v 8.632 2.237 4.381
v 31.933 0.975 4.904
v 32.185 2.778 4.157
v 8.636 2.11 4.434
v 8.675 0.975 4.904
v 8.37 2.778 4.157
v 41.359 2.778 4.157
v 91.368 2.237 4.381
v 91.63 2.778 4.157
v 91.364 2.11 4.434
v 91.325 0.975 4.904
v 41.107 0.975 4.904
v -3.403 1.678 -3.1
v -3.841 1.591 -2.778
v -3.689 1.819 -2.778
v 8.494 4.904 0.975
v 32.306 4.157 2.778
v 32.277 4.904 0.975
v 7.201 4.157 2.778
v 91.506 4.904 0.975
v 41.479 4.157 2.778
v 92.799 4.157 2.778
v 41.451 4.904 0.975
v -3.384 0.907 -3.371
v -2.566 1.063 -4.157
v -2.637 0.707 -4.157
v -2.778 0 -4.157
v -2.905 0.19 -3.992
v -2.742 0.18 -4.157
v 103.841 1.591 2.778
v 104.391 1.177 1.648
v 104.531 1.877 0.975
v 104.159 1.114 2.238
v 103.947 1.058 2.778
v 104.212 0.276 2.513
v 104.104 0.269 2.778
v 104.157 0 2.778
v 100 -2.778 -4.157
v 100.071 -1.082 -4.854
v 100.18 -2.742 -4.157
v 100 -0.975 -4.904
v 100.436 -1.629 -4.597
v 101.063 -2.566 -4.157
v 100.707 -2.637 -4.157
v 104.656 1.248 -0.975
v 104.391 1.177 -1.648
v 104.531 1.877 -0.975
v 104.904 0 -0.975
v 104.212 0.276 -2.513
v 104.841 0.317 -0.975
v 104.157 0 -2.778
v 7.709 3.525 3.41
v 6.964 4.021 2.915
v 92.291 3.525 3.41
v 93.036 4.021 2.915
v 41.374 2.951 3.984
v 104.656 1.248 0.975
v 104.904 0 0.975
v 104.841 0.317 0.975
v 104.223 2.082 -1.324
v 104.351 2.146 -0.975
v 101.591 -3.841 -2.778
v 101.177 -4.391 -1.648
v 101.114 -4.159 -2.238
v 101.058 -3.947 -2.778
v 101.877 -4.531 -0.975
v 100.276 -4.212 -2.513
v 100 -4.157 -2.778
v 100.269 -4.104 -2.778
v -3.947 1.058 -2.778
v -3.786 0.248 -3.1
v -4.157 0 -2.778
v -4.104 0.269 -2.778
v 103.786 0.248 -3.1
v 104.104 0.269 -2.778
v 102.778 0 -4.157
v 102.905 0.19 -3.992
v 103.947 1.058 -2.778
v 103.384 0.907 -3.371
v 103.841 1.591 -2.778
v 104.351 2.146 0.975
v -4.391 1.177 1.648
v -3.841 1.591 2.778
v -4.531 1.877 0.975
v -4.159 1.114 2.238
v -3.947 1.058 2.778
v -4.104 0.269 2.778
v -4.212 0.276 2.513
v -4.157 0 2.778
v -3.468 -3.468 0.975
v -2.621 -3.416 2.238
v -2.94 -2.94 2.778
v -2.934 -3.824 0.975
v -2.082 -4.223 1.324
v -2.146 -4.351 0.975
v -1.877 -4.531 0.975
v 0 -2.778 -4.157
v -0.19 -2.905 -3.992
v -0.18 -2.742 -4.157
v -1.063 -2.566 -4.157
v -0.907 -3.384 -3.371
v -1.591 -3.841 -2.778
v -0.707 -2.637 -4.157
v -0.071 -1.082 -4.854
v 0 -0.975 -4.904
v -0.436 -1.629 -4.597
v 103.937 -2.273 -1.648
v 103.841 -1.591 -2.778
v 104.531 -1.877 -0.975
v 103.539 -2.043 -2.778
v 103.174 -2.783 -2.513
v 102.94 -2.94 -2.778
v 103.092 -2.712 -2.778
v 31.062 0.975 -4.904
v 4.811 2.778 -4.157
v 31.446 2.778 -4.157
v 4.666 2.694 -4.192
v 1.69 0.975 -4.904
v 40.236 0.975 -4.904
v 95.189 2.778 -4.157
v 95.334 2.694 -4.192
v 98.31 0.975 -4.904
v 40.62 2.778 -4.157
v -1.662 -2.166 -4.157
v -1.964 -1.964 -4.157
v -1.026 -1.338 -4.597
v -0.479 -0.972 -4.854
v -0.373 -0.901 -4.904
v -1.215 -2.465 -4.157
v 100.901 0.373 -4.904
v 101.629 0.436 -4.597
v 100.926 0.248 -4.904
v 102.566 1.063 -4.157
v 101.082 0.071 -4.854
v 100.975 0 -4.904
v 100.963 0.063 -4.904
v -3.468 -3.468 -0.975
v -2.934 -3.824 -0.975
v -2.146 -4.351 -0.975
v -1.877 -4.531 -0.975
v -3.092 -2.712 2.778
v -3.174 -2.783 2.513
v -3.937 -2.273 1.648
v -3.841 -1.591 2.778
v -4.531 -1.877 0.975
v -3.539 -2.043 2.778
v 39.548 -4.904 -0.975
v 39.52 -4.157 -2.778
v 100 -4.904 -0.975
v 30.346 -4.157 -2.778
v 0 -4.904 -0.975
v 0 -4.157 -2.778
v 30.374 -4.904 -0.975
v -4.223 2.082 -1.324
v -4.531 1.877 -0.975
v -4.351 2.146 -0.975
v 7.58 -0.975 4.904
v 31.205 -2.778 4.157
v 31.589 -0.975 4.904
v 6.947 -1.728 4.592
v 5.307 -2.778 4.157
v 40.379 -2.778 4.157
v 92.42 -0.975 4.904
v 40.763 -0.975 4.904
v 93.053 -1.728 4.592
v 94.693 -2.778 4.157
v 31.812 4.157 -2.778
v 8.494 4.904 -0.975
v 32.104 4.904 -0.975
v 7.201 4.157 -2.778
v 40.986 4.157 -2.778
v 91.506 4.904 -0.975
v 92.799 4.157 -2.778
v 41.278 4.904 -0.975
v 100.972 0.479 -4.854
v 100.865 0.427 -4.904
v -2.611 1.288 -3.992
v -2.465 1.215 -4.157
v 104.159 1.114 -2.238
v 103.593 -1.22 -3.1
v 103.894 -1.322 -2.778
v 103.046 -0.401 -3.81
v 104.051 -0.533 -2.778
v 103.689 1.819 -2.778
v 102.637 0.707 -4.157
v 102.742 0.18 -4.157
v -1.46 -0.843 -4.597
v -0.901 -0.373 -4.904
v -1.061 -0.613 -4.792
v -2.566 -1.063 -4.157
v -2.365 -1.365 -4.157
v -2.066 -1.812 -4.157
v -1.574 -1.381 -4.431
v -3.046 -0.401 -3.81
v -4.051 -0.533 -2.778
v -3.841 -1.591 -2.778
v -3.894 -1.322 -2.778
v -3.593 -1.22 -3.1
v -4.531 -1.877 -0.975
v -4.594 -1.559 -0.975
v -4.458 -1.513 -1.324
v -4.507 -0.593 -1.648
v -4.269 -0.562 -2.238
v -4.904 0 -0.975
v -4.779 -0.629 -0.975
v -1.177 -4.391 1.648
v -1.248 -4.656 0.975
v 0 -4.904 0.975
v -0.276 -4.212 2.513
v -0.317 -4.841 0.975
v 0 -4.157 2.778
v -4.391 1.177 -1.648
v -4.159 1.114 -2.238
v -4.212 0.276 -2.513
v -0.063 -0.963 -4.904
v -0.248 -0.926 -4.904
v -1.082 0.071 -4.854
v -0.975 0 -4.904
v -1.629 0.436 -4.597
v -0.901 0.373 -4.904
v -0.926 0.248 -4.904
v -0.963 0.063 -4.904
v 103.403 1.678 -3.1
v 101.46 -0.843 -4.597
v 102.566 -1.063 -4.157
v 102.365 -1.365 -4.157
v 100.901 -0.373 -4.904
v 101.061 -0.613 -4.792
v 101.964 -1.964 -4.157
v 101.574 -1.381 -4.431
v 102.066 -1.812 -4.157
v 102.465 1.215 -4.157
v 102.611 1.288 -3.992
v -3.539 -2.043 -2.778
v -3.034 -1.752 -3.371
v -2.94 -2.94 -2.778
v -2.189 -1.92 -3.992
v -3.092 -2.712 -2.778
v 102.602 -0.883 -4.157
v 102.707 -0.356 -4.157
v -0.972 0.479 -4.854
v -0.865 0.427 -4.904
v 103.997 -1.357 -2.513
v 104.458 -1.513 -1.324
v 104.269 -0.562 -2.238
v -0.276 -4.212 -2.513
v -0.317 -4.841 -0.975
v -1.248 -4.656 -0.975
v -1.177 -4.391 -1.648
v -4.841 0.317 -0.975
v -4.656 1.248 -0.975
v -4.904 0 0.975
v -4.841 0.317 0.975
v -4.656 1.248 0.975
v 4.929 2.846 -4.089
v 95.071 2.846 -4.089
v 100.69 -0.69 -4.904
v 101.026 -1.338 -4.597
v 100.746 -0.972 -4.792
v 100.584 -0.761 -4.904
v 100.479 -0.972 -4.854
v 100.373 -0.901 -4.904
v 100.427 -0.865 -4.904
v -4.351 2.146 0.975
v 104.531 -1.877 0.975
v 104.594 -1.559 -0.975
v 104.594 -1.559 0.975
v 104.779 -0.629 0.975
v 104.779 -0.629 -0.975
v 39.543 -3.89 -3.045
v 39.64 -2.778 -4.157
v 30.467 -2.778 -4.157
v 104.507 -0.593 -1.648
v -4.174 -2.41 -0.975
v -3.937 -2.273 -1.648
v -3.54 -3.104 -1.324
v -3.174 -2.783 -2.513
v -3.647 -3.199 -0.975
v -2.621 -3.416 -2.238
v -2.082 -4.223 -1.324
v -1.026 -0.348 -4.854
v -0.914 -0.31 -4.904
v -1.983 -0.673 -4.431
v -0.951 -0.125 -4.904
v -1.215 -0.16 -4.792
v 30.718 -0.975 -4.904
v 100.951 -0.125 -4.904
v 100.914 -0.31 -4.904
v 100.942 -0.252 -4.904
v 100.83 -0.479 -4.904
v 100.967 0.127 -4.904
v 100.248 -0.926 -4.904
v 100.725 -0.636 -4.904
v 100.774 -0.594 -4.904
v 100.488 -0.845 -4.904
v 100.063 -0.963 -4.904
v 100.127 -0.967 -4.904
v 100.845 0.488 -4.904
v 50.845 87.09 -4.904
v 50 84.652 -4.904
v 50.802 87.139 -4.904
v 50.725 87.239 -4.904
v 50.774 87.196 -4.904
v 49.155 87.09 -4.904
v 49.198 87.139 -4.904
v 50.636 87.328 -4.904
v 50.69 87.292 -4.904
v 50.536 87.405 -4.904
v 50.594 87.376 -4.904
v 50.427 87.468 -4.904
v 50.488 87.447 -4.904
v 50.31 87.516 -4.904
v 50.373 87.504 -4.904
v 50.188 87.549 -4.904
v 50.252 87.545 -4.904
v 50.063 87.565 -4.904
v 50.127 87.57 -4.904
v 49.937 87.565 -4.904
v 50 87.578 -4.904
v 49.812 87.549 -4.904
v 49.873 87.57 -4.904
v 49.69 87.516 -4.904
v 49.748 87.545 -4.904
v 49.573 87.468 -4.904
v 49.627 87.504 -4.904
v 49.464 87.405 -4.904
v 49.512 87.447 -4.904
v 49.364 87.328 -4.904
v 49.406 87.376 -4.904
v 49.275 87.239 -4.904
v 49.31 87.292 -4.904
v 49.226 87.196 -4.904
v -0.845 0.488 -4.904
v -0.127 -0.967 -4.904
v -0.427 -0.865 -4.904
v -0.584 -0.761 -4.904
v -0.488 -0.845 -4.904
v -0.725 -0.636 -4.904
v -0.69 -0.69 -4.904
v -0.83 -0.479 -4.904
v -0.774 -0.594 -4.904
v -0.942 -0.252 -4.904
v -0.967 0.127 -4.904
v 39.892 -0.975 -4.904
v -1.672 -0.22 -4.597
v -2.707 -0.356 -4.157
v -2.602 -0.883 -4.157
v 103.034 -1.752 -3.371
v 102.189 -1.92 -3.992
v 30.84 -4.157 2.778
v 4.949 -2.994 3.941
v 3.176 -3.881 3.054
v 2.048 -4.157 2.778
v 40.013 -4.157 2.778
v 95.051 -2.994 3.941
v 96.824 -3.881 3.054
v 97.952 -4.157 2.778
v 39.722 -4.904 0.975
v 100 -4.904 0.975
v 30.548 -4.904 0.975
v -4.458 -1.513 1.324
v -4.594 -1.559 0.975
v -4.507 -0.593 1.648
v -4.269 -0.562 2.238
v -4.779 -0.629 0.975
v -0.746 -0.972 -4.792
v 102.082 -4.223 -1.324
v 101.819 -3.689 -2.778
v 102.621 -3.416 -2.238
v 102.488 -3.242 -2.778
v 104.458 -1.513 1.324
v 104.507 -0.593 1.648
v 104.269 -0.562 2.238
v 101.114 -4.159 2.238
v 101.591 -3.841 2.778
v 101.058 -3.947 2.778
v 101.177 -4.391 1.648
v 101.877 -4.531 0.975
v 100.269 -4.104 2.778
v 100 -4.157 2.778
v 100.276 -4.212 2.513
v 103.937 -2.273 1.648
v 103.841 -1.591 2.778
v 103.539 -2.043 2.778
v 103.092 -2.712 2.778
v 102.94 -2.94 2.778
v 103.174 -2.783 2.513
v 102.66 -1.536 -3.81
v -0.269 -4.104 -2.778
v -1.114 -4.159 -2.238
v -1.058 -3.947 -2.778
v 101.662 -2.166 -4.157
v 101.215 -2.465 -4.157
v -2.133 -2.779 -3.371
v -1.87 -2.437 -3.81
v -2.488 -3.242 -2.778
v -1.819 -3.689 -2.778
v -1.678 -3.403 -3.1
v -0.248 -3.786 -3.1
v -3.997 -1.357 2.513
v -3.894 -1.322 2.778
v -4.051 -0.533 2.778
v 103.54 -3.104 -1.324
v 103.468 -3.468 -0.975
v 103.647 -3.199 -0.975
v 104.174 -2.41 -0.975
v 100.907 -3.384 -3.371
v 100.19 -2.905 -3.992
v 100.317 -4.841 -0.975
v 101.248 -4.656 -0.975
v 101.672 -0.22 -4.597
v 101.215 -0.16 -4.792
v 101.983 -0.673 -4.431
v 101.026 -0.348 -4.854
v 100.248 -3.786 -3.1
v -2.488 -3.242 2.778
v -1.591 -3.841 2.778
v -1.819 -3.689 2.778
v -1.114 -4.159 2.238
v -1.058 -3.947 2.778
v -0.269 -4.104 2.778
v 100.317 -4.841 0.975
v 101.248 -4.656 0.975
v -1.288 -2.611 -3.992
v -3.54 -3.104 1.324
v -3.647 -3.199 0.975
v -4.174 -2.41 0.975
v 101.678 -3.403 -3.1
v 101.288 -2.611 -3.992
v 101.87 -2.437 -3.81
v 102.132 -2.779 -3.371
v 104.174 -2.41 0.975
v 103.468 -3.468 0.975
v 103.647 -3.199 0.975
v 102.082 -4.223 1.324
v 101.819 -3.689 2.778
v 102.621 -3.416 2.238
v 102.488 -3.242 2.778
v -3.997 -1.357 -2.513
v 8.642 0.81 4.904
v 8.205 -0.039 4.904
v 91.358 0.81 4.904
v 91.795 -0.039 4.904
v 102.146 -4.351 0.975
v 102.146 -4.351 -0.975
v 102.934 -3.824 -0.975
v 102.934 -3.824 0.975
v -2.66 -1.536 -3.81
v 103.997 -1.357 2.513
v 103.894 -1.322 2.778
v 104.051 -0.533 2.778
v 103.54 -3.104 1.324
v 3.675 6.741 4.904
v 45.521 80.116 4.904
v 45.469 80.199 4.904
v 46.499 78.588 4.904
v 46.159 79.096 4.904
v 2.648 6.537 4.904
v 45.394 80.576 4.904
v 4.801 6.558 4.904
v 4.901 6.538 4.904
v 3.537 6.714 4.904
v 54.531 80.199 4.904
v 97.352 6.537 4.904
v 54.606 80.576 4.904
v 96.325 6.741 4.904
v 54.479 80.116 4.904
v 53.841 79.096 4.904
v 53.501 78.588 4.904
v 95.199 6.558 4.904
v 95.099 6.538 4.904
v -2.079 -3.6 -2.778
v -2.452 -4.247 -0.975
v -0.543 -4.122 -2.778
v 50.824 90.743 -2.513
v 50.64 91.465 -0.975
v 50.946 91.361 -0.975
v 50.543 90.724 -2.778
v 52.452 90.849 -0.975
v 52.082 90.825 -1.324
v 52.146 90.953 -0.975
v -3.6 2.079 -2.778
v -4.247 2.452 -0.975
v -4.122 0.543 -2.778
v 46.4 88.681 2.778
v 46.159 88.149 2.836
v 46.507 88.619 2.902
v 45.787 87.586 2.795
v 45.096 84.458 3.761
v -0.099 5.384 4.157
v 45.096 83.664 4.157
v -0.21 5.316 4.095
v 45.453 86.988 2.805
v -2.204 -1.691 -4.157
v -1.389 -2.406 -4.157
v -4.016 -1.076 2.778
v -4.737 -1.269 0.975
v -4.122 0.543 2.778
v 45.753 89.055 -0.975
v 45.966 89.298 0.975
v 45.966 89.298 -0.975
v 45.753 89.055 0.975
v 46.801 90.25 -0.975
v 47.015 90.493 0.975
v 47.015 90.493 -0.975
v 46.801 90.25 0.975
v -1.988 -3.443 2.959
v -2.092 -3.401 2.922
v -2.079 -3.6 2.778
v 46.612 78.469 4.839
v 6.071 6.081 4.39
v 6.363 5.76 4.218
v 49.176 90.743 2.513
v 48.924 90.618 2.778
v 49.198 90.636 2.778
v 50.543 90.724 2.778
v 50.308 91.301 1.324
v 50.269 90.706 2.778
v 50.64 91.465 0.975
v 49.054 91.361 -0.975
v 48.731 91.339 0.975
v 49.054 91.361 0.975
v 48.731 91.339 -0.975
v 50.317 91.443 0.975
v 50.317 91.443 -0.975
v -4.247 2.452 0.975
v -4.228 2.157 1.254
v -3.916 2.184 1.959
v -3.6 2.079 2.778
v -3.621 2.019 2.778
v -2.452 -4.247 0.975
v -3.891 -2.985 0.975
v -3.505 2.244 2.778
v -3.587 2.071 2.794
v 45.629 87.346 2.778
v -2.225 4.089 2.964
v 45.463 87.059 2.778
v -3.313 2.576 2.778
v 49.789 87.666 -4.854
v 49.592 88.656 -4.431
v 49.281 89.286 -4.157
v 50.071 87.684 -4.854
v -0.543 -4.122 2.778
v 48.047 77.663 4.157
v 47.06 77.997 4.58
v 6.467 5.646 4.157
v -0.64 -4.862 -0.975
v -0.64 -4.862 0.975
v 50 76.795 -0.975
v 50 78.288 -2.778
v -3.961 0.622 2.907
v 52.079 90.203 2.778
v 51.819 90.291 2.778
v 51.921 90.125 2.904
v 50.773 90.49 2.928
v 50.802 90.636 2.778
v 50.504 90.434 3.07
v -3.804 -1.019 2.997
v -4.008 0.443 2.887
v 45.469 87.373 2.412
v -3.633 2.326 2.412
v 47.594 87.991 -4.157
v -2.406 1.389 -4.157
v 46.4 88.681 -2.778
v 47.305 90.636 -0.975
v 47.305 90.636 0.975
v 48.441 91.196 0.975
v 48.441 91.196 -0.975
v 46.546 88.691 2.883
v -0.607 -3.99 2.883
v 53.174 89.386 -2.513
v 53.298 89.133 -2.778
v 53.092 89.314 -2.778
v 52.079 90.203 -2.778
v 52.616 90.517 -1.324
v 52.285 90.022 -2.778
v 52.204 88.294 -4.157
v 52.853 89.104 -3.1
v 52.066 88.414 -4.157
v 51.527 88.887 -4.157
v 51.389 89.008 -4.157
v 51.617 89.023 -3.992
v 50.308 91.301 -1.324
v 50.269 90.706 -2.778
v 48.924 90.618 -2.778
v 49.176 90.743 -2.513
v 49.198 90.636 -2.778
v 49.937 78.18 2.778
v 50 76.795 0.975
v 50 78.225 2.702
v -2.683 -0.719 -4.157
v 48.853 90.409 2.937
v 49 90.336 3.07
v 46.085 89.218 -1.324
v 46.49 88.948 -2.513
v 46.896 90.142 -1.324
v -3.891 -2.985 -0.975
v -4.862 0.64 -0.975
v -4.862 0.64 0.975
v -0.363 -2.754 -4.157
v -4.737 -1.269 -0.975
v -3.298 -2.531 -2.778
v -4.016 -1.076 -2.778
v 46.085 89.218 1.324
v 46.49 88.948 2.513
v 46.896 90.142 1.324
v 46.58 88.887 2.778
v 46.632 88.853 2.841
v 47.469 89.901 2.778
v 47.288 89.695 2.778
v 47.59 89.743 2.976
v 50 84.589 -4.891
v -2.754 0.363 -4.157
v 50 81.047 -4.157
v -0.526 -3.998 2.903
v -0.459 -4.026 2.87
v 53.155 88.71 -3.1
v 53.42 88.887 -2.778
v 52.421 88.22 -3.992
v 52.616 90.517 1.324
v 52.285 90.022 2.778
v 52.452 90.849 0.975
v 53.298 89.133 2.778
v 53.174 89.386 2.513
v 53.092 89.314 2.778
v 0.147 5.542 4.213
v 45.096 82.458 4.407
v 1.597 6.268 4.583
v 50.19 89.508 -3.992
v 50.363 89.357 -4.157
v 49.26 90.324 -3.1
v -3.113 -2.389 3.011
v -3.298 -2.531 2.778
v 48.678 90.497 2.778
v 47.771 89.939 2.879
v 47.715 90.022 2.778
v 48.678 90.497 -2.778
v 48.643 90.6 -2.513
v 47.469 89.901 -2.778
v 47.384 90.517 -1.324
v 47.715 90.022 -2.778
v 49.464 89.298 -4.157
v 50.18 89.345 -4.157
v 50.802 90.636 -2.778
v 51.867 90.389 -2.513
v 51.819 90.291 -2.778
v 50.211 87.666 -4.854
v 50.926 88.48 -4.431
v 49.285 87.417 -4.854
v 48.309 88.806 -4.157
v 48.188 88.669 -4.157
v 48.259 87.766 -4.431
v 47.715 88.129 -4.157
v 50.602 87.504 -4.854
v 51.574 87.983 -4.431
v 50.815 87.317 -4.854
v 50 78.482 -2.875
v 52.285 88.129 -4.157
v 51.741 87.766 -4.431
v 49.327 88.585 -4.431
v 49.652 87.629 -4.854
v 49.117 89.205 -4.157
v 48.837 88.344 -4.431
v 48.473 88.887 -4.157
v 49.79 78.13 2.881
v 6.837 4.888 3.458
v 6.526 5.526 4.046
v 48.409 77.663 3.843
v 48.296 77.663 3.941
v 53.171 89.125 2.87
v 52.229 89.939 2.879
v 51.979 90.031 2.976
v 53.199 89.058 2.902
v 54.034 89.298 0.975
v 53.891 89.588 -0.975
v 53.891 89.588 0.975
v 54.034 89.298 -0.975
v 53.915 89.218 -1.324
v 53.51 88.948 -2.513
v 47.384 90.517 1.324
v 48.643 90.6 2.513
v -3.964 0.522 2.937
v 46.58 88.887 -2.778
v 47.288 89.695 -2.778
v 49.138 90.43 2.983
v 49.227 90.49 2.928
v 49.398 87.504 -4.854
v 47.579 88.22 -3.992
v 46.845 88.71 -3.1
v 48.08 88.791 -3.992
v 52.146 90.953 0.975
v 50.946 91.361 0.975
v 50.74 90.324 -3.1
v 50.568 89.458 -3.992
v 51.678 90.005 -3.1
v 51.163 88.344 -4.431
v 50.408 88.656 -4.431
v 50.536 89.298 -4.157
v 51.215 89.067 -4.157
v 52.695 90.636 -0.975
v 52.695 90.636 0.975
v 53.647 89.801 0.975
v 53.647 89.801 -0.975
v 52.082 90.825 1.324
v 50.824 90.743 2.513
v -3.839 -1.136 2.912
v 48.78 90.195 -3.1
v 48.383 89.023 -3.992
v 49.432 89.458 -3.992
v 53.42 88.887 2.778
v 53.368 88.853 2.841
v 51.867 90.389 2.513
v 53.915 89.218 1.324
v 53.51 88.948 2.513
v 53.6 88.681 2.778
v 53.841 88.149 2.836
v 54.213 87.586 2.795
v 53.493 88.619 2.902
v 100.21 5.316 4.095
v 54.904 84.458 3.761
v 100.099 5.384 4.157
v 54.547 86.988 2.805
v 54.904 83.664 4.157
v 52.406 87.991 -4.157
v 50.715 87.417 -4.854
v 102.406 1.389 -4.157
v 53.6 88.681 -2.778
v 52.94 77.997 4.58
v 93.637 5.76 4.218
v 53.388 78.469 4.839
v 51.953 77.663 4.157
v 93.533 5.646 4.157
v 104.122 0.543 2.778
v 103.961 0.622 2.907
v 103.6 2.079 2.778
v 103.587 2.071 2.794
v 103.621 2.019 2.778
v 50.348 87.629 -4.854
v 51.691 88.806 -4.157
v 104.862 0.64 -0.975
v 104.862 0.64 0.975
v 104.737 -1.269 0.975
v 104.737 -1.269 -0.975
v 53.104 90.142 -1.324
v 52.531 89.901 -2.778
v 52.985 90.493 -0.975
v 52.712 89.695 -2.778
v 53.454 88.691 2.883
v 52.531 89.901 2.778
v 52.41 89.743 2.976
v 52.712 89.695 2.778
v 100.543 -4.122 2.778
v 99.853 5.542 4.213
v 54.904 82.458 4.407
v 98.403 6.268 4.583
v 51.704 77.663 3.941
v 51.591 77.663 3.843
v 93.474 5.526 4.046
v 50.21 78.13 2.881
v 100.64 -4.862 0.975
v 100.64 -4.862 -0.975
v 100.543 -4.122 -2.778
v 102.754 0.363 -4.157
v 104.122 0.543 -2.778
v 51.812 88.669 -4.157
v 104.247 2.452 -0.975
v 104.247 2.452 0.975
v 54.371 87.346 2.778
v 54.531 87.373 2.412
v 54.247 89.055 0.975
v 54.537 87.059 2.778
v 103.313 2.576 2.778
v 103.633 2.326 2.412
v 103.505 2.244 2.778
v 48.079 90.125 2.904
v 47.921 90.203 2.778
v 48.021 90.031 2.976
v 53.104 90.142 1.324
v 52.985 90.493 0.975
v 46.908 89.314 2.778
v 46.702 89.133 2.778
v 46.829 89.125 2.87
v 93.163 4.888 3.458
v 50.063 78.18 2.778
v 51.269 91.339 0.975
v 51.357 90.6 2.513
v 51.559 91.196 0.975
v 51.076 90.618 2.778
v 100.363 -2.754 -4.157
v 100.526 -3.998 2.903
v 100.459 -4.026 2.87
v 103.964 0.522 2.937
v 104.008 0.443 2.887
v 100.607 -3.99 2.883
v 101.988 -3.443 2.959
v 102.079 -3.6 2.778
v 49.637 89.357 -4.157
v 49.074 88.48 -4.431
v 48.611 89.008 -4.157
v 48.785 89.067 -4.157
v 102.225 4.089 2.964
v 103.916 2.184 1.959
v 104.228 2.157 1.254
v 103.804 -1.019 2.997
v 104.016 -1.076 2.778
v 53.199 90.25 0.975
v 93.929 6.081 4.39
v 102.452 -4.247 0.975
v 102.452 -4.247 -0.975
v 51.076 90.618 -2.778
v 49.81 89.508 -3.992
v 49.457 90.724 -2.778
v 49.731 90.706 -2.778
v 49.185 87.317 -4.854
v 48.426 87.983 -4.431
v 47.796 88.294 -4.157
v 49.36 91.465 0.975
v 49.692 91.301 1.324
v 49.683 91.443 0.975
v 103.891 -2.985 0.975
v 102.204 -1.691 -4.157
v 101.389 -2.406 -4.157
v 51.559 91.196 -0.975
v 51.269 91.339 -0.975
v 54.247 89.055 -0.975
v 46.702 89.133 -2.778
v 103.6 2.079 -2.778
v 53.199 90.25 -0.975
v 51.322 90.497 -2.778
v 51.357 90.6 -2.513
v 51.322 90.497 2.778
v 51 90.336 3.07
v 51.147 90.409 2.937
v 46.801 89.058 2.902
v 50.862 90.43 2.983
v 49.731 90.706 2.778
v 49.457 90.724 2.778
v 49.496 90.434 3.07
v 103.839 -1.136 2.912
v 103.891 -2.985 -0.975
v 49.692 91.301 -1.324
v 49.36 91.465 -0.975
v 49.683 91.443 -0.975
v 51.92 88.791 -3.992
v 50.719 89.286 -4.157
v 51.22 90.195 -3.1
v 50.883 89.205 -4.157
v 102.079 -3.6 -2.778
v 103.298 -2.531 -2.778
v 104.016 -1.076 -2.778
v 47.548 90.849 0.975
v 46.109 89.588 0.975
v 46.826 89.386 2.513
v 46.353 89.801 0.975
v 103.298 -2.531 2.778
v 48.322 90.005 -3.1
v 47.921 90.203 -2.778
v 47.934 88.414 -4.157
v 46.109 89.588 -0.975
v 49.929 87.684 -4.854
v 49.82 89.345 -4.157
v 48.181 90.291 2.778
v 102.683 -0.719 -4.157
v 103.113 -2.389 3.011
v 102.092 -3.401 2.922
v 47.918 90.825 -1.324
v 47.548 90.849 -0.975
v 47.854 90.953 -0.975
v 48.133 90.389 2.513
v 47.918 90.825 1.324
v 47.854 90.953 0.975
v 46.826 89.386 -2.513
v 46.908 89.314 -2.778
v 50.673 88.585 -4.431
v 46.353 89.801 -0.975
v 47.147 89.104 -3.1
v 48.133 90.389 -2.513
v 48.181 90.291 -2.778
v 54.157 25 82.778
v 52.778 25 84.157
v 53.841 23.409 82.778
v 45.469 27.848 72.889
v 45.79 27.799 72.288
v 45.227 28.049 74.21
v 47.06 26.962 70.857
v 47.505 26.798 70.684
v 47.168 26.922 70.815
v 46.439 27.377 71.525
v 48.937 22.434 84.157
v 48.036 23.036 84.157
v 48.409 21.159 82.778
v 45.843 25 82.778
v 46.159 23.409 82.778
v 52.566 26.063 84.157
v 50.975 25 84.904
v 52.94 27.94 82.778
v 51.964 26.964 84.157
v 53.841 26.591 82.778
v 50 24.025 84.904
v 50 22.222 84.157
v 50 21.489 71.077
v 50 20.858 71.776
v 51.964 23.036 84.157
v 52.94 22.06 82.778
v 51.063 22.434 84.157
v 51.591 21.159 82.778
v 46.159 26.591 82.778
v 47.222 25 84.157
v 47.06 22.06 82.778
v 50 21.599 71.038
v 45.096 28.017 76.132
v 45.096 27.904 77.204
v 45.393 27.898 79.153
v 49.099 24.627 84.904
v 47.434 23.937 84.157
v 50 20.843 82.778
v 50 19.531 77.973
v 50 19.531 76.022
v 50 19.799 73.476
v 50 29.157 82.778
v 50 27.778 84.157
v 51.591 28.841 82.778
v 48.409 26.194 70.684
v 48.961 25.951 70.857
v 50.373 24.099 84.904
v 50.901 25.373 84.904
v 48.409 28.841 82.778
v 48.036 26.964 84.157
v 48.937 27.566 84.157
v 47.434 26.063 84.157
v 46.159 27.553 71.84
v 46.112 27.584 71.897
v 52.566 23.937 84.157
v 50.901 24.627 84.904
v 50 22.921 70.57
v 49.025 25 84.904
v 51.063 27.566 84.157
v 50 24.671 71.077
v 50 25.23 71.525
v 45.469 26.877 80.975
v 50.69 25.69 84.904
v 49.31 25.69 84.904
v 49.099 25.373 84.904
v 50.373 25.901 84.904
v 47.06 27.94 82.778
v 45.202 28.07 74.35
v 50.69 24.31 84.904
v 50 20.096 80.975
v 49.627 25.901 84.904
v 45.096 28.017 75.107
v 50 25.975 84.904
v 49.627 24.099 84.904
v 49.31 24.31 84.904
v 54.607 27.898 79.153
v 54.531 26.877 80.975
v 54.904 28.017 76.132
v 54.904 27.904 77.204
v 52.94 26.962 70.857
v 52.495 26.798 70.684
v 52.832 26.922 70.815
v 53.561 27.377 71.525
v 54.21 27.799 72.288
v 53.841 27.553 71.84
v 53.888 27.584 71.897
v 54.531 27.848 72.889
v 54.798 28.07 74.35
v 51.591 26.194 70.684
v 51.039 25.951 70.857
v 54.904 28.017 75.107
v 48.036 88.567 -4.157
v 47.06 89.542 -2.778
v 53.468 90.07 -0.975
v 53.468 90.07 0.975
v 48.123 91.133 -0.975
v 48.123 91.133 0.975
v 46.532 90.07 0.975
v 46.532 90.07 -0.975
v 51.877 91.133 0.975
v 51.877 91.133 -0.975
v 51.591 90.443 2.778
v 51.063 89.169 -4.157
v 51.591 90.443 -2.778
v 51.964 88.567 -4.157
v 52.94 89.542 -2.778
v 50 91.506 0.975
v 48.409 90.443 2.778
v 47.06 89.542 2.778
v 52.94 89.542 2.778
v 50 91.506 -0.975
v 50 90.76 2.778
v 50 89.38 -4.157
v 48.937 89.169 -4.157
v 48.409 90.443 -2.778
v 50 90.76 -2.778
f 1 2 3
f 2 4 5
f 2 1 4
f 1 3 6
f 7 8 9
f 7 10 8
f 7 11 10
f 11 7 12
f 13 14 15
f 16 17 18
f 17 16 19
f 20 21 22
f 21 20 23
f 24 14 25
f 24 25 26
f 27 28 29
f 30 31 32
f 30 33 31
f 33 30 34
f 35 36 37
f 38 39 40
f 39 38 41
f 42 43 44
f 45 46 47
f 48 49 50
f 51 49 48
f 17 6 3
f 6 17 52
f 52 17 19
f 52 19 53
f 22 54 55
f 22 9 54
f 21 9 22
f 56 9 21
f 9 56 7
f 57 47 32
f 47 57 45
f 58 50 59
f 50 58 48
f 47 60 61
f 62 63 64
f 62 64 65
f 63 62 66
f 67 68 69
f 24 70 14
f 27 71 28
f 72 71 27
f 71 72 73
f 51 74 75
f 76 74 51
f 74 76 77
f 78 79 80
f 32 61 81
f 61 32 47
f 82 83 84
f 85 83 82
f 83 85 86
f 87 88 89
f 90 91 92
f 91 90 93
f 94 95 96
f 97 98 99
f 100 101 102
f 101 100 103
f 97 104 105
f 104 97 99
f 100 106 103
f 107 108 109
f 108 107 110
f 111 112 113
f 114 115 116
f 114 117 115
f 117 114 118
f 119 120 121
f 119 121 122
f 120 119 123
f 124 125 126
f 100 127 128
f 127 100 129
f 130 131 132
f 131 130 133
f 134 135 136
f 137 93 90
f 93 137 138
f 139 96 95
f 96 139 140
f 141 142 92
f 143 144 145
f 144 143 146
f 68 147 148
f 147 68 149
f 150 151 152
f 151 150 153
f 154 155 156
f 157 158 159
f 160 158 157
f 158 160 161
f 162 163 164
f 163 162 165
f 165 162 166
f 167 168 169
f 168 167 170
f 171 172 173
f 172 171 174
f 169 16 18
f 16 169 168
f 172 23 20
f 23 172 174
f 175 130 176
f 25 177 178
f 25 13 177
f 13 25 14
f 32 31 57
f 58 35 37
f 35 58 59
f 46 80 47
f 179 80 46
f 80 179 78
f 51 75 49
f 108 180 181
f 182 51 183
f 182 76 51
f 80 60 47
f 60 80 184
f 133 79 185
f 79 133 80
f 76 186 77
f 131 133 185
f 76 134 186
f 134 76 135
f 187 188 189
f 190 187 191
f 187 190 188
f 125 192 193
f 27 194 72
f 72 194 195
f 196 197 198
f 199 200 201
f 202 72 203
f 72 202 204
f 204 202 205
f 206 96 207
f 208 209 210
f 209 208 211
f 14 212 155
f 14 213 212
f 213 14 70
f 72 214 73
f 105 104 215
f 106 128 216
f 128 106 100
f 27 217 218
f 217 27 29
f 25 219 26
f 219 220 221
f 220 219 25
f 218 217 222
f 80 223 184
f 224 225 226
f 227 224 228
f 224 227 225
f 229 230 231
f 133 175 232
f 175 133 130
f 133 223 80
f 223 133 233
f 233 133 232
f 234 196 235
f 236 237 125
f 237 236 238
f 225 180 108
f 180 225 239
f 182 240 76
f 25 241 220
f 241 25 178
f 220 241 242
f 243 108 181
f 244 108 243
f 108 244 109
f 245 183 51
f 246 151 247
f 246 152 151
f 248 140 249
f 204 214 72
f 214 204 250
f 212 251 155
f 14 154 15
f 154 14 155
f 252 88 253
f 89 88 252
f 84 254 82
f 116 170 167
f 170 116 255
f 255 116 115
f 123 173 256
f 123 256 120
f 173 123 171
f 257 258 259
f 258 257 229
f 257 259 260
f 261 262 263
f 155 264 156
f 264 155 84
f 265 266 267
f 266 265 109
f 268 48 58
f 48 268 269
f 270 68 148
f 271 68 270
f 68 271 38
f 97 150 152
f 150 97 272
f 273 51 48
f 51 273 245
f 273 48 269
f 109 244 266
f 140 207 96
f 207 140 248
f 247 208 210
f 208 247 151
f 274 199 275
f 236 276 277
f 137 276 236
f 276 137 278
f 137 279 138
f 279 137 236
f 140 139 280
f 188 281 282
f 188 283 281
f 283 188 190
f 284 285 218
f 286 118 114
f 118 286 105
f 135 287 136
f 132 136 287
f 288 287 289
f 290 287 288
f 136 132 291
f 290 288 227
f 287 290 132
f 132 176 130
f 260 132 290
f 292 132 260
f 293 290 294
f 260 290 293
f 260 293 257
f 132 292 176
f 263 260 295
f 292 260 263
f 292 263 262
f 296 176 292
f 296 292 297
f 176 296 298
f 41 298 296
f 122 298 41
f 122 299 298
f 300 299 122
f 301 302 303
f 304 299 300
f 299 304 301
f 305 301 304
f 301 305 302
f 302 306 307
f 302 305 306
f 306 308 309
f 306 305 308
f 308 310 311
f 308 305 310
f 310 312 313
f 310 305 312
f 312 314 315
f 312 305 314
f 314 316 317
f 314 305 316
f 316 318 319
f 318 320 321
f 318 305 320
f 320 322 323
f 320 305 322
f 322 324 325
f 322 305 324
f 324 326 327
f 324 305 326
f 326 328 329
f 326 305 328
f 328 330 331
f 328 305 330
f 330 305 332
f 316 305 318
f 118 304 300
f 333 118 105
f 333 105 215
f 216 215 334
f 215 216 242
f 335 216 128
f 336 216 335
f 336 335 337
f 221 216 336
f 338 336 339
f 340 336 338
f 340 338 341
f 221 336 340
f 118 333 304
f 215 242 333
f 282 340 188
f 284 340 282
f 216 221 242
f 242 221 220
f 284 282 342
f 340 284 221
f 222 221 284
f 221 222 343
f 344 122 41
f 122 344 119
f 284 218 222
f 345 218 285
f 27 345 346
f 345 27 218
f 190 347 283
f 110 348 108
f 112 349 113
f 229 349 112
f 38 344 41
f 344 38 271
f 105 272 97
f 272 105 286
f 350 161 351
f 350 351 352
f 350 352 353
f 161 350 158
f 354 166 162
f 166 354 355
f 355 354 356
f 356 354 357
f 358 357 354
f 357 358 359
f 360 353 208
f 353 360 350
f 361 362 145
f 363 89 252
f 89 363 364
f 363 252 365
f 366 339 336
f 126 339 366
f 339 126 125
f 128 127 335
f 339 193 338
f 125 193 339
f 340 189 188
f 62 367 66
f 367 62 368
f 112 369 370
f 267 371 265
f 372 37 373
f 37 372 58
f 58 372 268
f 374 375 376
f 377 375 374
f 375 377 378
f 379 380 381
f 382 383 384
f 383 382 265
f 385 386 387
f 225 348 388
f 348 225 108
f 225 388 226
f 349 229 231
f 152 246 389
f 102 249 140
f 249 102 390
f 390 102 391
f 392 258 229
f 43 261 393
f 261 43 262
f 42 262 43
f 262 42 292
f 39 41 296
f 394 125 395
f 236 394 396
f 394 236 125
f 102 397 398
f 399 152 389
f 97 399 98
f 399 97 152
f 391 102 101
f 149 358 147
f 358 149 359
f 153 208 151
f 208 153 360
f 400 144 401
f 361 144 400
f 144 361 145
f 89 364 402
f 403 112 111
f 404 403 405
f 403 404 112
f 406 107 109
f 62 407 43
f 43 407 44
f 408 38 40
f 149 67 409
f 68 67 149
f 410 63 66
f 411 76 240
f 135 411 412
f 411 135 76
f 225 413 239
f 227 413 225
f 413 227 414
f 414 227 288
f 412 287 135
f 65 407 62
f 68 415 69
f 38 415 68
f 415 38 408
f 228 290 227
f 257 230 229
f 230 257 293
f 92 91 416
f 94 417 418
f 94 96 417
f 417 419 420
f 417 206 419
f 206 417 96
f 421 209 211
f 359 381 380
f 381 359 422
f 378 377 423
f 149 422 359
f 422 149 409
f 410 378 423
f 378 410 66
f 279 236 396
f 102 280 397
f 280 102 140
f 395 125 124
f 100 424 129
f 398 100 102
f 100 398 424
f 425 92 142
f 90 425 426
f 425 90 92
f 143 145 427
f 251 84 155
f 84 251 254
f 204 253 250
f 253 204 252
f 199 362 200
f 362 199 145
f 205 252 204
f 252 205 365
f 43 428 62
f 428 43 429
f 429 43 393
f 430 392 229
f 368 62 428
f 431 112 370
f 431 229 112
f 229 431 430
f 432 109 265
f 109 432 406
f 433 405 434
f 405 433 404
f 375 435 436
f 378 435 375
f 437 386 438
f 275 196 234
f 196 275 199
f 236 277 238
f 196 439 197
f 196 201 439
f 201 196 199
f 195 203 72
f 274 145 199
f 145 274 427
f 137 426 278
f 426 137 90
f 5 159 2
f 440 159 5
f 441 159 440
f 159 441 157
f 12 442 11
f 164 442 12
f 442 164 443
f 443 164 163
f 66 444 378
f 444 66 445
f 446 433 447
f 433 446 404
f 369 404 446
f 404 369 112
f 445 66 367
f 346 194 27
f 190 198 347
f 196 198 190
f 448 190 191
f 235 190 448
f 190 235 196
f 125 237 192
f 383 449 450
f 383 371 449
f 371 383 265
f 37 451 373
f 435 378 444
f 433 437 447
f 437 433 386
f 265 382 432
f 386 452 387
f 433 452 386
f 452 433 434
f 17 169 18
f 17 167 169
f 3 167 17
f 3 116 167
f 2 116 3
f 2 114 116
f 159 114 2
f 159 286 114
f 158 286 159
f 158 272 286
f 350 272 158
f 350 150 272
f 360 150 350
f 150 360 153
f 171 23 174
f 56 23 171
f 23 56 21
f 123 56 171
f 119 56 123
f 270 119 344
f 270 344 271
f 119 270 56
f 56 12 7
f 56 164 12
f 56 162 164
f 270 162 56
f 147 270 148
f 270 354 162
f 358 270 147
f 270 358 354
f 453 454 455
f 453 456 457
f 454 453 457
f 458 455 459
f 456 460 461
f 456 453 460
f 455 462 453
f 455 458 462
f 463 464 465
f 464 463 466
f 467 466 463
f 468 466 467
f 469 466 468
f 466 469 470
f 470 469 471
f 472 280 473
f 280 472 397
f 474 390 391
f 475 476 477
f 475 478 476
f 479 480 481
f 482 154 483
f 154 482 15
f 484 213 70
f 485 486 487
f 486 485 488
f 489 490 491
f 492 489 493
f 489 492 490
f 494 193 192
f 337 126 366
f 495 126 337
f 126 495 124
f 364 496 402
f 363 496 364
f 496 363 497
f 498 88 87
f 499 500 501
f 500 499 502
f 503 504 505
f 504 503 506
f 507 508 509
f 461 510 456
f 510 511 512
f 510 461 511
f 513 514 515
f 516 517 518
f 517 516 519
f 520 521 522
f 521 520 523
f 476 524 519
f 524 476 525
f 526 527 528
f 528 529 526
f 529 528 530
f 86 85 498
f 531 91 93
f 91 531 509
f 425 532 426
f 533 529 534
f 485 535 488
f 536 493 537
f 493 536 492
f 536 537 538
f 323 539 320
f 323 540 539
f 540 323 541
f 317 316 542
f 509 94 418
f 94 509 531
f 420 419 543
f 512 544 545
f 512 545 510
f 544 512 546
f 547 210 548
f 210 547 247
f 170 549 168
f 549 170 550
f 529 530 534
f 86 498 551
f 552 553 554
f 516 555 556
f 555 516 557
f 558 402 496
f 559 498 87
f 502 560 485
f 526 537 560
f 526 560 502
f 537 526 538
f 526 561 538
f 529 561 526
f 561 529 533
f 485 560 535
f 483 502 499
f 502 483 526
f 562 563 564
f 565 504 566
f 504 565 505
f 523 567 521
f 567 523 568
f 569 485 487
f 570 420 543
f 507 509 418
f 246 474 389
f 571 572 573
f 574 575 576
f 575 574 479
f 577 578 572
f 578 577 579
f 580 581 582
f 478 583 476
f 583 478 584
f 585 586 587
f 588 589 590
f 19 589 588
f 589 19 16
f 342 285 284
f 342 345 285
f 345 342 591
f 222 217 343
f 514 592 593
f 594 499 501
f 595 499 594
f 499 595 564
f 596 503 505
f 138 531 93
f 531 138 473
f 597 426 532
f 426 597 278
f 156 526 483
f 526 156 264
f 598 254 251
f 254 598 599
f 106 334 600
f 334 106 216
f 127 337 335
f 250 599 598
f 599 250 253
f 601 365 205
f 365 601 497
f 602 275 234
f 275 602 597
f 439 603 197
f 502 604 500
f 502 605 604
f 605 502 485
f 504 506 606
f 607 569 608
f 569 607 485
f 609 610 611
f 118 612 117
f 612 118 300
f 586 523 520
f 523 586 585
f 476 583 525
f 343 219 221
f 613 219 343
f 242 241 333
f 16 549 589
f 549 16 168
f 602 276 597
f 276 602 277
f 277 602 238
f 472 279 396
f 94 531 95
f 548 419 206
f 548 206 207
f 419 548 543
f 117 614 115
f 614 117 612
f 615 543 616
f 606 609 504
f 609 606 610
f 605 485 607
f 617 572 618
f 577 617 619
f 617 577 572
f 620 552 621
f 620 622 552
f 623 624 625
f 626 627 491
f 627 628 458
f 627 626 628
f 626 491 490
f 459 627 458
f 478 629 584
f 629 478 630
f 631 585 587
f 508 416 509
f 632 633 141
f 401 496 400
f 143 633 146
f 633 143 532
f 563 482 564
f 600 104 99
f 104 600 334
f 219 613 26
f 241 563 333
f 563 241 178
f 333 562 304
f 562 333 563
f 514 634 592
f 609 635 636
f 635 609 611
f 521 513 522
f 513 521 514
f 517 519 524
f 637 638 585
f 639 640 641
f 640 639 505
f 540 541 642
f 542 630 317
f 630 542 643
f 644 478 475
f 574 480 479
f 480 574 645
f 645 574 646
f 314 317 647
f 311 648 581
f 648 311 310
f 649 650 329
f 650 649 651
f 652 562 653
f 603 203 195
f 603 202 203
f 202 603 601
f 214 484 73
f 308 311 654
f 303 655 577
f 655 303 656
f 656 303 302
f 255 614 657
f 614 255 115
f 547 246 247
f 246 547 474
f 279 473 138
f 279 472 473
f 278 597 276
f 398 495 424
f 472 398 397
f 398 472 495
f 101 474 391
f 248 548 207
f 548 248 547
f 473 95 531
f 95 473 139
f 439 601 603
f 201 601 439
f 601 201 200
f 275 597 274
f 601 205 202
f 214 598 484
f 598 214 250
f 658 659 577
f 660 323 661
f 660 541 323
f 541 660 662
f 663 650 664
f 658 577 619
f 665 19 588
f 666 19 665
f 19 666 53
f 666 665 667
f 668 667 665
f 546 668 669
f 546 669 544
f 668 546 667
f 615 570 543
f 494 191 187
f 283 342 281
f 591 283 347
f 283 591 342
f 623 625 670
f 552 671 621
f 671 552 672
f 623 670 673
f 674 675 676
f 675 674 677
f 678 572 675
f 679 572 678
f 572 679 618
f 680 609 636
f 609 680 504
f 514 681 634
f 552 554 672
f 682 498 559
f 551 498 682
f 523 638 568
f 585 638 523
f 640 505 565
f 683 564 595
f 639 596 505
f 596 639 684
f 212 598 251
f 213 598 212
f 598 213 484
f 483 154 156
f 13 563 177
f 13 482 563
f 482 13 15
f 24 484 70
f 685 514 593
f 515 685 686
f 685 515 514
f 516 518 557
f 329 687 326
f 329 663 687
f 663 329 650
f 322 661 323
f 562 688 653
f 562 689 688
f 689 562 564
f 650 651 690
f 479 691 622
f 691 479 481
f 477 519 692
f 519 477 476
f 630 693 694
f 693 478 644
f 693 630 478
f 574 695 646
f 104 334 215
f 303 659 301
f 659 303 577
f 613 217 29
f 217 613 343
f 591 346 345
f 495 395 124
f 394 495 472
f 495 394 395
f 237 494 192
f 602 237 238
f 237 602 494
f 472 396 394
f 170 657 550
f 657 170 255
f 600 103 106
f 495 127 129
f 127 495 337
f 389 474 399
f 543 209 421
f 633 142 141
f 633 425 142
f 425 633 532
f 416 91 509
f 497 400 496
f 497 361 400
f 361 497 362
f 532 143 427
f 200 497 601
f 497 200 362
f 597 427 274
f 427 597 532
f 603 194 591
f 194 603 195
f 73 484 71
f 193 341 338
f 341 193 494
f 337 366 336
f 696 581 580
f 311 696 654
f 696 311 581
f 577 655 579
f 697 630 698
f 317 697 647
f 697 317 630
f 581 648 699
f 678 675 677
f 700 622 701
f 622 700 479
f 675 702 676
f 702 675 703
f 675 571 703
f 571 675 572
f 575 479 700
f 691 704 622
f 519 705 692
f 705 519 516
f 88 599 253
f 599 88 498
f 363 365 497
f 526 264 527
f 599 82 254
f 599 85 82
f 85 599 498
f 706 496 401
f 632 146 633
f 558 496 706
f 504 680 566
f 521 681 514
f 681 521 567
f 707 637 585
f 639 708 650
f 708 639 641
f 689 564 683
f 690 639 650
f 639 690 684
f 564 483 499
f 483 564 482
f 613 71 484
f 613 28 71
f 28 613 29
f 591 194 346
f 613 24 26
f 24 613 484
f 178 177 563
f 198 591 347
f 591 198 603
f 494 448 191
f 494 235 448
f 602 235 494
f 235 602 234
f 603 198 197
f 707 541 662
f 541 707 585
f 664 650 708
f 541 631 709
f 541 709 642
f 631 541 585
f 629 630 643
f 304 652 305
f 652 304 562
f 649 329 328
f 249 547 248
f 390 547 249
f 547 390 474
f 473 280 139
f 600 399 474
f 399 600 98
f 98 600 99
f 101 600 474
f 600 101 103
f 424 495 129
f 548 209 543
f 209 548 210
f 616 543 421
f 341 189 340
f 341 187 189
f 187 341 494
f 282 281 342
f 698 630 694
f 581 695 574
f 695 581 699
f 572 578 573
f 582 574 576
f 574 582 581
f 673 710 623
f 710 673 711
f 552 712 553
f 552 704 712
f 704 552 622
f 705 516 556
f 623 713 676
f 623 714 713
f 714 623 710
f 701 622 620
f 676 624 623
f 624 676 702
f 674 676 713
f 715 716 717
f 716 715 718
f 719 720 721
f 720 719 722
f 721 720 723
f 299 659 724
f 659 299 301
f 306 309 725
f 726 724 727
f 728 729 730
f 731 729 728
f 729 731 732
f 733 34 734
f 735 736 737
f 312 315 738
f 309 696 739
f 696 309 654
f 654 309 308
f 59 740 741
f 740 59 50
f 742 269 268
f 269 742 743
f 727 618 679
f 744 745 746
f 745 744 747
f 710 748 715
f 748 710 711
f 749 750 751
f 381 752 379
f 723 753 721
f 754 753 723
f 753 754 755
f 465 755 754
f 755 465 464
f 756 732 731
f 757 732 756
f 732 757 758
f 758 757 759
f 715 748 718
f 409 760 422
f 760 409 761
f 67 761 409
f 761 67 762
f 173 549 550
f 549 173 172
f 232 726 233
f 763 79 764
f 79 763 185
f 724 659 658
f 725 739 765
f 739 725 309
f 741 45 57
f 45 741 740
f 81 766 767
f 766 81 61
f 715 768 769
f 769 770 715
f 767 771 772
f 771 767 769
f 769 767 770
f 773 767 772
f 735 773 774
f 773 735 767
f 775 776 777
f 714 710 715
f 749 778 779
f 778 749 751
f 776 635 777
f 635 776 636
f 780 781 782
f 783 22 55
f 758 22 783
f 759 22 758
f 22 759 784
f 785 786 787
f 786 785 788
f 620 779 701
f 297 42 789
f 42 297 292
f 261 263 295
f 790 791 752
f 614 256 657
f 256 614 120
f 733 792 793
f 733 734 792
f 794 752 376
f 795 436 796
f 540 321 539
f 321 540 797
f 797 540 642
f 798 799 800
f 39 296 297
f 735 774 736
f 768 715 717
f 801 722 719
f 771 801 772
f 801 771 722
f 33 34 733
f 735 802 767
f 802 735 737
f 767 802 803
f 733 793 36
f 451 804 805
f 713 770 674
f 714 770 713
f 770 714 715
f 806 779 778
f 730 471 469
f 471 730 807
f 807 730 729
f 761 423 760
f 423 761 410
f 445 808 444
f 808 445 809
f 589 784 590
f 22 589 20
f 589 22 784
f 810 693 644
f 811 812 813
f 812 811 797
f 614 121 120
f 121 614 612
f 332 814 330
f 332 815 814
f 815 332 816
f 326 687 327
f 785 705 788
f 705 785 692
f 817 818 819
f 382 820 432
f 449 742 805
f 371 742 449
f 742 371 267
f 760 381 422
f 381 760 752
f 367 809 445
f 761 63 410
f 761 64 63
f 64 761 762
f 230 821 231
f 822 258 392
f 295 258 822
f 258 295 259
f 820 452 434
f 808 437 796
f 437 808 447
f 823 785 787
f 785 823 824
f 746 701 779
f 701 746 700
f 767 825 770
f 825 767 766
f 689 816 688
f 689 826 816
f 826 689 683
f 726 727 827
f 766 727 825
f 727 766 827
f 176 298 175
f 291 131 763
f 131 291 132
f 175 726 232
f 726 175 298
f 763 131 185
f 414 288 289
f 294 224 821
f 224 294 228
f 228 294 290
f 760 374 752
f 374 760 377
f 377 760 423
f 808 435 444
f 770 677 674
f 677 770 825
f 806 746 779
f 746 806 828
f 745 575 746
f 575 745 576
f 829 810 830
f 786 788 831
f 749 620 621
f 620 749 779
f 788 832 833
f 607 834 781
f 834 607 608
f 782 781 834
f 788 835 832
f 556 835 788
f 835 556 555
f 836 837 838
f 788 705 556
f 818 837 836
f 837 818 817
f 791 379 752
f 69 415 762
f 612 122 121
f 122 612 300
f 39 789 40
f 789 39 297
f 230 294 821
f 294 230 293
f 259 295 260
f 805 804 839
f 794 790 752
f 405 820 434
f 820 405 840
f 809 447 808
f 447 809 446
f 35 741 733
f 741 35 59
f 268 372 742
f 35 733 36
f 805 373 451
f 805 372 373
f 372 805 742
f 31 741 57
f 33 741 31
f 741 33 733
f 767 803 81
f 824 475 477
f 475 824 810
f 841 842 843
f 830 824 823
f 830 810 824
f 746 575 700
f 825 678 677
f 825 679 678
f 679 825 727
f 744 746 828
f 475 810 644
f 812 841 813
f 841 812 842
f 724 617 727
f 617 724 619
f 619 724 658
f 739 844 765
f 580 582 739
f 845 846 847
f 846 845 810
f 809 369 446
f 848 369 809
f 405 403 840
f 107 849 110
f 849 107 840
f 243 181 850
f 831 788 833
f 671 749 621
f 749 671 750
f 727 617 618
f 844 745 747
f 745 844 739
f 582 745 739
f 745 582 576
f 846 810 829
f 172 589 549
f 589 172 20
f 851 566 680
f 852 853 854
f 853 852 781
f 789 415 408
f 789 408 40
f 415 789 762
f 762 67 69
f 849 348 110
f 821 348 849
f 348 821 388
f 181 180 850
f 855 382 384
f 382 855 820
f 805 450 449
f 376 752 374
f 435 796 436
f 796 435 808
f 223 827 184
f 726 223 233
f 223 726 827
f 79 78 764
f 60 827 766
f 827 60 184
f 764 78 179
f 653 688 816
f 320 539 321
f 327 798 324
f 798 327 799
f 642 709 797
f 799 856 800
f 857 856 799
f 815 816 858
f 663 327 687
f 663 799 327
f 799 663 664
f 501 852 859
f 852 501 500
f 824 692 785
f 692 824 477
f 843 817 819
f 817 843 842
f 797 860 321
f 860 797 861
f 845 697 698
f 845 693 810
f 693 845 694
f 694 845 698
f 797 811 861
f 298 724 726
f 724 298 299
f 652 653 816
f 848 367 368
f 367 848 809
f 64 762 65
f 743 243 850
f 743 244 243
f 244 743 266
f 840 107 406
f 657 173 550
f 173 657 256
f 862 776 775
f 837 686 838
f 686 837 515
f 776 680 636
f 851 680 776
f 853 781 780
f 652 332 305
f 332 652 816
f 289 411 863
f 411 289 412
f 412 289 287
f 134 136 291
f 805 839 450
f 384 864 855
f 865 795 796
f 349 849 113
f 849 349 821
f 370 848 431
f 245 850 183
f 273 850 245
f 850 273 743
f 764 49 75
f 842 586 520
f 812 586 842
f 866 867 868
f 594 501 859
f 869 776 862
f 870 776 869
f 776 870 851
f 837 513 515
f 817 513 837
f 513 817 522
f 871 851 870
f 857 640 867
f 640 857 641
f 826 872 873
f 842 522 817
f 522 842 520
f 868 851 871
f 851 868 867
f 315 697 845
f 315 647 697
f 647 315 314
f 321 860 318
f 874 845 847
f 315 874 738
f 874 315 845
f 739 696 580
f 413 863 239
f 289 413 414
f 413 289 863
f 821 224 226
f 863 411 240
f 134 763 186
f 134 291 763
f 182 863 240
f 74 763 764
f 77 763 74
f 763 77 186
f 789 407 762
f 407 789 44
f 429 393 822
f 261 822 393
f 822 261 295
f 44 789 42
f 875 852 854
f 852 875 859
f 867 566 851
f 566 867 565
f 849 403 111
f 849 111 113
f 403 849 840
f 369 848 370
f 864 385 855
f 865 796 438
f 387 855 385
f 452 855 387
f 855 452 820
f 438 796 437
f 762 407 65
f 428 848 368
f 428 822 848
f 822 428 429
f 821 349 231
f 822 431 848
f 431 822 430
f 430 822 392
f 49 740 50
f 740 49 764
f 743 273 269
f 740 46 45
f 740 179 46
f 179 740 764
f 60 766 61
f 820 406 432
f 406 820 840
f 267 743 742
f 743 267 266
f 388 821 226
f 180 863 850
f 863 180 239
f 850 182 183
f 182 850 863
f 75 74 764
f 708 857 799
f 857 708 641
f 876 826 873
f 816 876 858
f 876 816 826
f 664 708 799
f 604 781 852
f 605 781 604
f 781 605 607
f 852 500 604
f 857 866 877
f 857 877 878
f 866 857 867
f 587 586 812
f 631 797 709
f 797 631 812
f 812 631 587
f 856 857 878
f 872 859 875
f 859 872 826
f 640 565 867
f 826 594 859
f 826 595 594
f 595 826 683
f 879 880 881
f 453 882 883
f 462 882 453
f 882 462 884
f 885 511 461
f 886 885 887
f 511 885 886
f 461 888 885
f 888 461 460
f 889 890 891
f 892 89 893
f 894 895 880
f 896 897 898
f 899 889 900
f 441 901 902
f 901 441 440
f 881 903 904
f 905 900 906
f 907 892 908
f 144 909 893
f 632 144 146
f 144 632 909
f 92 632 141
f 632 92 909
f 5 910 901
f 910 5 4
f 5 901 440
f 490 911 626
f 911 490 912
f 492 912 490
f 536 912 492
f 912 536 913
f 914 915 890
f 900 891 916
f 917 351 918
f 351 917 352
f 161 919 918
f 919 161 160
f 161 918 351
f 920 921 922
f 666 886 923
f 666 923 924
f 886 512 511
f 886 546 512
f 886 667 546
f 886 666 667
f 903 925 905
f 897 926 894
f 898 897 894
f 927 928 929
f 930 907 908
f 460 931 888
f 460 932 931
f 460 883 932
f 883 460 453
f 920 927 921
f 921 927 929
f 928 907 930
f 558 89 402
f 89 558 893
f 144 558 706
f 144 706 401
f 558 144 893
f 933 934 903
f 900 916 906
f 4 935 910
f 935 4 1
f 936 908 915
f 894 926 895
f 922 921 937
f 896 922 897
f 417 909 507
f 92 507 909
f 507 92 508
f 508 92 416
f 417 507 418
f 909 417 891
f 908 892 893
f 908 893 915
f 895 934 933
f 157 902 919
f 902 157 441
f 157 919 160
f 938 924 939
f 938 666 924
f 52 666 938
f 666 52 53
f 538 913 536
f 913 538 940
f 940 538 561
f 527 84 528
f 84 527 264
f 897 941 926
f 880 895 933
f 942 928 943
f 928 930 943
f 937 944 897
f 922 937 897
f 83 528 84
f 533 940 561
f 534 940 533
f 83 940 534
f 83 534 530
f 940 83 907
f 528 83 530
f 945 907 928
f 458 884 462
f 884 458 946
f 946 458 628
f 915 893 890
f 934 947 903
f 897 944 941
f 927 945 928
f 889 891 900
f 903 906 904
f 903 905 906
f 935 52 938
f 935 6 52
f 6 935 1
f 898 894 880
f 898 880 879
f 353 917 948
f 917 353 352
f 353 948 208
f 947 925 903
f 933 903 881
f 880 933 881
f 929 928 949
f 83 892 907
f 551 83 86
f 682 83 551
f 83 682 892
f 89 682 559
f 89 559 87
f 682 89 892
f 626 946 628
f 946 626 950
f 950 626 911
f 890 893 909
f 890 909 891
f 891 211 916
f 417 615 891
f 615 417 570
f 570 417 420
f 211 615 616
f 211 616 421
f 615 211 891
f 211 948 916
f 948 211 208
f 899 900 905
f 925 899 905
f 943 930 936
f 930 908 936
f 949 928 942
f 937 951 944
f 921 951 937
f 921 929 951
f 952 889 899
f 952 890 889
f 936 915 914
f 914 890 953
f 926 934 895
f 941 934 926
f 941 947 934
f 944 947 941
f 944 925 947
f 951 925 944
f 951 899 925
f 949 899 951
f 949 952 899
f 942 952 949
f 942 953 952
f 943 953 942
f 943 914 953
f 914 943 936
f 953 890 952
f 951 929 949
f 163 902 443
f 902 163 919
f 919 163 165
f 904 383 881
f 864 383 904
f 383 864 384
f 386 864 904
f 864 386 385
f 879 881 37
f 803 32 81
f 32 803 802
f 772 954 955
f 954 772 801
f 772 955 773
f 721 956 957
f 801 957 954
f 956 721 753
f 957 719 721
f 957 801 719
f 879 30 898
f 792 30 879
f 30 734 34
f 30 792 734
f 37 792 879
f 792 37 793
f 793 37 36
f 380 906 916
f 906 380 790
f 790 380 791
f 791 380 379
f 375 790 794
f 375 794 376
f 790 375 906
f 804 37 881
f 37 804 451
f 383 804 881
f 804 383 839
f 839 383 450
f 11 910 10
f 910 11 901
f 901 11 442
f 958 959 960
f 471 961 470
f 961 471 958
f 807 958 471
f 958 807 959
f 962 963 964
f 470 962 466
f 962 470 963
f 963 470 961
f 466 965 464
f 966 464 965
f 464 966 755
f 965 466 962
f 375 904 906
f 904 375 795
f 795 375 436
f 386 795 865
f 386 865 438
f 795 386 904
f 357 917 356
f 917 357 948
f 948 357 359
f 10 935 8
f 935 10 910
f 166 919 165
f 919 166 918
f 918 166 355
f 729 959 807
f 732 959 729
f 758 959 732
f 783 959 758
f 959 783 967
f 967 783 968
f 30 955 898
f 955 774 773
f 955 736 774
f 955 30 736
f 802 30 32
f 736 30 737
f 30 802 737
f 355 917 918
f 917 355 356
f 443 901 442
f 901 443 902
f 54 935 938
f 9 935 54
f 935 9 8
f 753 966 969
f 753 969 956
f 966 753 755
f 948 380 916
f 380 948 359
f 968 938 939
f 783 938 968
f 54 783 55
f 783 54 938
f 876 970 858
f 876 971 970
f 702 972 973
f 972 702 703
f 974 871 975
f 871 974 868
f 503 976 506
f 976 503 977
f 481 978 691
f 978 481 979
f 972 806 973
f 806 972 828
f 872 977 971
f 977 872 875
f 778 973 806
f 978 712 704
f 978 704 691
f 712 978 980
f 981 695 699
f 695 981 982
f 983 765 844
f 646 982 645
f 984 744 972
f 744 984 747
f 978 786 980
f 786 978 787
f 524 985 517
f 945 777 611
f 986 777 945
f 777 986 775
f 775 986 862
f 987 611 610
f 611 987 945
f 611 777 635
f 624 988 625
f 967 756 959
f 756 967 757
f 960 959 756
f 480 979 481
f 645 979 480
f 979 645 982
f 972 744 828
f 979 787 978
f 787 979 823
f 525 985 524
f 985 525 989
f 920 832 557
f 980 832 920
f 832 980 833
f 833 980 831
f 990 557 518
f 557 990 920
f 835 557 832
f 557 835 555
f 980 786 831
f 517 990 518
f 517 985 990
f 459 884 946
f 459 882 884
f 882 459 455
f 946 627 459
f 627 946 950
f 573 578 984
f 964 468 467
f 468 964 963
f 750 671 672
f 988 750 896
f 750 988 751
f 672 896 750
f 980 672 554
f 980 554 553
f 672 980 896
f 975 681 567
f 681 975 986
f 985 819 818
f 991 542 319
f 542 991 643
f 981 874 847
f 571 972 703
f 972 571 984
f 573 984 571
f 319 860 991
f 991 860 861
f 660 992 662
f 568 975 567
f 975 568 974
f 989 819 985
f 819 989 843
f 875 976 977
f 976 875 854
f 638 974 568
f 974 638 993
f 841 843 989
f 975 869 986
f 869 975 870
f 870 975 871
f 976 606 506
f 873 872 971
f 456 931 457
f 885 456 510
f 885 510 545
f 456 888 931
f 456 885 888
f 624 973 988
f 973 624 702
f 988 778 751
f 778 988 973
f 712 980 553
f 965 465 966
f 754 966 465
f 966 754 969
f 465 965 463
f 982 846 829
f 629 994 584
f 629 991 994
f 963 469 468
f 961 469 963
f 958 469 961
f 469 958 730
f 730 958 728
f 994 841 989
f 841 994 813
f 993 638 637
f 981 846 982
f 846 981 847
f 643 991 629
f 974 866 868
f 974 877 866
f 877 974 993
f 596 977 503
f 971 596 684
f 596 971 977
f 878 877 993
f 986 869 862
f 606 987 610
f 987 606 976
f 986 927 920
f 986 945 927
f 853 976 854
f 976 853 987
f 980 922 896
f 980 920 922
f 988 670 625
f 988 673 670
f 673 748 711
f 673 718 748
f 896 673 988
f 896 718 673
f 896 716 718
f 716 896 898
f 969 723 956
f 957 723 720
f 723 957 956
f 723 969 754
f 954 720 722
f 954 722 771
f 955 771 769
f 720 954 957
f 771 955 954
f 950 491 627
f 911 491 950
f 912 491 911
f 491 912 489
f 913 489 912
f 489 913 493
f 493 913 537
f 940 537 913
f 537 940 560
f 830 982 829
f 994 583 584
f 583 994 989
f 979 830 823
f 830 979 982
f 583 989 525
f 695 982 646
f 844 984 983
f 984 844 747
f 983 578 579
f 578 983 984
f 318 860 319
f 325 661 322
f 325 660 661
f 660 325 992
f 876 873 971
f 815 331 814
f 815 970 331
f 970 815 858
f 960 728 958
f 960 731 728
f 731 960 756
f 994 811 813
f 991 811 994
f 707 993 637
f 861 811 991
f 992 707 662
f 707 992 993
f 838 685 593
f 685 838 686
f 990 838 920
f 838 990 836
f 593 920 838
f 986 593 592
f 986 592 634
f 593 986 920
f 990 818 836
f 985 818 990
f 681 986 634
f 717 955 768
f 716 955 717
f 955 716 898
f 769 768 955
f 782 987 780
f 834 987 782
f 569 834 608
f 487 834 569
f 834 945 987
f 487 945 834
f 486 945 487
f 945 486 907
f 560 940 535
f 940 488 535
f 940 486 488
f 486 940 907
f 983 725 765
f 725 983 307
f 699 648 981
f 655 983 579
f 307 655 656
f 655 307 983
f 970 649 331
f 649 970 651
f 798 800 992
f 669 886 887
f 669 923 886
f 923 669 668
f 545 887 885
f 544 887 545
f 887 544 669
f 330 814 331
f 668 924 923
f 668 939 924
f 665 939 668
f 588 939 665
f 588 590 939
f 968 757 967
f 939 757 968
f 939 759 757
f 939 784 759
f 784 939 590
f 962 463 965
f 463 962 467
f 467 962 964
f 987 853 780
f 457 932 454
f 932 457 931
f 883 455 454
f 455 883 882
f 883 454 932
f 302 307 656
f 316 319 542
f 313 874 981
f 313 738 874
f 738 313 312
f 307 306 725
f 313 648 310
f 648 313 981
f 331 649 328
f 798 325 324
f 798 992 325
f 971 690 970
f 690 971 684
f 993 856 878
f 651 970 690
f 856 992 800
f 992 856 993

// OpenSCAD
//Loguncov Maxim 19.12.13

module rod() {
hull (){
sphere (5);
translate ([100,0,0]) {
sphere (5);
}}}

difference(){
rod();
translate ([30,-5,-5]){
rotate ([0,5,-10]){
cube([9,15,15]);
}}}

rotate ([0,0,60]) {rod();}
translate ([100,0,0]){
rotate ([0,0,120]) {rod();}
}

hull (){
sphere (5);
translate ([50,(50*sin(30)),80]) { sphere (5); }
}

hull (){
translate ([100,0,0]){
sphere (5);}
translate ([50,(50*sin(30)),80]) {
sphere (5);
}}

hull (){
translate ([50,(100*cos(30)),0]){
sphere (5);}
translate ([50,(50*sin(30)),80]) {
sphere (5);
}}
